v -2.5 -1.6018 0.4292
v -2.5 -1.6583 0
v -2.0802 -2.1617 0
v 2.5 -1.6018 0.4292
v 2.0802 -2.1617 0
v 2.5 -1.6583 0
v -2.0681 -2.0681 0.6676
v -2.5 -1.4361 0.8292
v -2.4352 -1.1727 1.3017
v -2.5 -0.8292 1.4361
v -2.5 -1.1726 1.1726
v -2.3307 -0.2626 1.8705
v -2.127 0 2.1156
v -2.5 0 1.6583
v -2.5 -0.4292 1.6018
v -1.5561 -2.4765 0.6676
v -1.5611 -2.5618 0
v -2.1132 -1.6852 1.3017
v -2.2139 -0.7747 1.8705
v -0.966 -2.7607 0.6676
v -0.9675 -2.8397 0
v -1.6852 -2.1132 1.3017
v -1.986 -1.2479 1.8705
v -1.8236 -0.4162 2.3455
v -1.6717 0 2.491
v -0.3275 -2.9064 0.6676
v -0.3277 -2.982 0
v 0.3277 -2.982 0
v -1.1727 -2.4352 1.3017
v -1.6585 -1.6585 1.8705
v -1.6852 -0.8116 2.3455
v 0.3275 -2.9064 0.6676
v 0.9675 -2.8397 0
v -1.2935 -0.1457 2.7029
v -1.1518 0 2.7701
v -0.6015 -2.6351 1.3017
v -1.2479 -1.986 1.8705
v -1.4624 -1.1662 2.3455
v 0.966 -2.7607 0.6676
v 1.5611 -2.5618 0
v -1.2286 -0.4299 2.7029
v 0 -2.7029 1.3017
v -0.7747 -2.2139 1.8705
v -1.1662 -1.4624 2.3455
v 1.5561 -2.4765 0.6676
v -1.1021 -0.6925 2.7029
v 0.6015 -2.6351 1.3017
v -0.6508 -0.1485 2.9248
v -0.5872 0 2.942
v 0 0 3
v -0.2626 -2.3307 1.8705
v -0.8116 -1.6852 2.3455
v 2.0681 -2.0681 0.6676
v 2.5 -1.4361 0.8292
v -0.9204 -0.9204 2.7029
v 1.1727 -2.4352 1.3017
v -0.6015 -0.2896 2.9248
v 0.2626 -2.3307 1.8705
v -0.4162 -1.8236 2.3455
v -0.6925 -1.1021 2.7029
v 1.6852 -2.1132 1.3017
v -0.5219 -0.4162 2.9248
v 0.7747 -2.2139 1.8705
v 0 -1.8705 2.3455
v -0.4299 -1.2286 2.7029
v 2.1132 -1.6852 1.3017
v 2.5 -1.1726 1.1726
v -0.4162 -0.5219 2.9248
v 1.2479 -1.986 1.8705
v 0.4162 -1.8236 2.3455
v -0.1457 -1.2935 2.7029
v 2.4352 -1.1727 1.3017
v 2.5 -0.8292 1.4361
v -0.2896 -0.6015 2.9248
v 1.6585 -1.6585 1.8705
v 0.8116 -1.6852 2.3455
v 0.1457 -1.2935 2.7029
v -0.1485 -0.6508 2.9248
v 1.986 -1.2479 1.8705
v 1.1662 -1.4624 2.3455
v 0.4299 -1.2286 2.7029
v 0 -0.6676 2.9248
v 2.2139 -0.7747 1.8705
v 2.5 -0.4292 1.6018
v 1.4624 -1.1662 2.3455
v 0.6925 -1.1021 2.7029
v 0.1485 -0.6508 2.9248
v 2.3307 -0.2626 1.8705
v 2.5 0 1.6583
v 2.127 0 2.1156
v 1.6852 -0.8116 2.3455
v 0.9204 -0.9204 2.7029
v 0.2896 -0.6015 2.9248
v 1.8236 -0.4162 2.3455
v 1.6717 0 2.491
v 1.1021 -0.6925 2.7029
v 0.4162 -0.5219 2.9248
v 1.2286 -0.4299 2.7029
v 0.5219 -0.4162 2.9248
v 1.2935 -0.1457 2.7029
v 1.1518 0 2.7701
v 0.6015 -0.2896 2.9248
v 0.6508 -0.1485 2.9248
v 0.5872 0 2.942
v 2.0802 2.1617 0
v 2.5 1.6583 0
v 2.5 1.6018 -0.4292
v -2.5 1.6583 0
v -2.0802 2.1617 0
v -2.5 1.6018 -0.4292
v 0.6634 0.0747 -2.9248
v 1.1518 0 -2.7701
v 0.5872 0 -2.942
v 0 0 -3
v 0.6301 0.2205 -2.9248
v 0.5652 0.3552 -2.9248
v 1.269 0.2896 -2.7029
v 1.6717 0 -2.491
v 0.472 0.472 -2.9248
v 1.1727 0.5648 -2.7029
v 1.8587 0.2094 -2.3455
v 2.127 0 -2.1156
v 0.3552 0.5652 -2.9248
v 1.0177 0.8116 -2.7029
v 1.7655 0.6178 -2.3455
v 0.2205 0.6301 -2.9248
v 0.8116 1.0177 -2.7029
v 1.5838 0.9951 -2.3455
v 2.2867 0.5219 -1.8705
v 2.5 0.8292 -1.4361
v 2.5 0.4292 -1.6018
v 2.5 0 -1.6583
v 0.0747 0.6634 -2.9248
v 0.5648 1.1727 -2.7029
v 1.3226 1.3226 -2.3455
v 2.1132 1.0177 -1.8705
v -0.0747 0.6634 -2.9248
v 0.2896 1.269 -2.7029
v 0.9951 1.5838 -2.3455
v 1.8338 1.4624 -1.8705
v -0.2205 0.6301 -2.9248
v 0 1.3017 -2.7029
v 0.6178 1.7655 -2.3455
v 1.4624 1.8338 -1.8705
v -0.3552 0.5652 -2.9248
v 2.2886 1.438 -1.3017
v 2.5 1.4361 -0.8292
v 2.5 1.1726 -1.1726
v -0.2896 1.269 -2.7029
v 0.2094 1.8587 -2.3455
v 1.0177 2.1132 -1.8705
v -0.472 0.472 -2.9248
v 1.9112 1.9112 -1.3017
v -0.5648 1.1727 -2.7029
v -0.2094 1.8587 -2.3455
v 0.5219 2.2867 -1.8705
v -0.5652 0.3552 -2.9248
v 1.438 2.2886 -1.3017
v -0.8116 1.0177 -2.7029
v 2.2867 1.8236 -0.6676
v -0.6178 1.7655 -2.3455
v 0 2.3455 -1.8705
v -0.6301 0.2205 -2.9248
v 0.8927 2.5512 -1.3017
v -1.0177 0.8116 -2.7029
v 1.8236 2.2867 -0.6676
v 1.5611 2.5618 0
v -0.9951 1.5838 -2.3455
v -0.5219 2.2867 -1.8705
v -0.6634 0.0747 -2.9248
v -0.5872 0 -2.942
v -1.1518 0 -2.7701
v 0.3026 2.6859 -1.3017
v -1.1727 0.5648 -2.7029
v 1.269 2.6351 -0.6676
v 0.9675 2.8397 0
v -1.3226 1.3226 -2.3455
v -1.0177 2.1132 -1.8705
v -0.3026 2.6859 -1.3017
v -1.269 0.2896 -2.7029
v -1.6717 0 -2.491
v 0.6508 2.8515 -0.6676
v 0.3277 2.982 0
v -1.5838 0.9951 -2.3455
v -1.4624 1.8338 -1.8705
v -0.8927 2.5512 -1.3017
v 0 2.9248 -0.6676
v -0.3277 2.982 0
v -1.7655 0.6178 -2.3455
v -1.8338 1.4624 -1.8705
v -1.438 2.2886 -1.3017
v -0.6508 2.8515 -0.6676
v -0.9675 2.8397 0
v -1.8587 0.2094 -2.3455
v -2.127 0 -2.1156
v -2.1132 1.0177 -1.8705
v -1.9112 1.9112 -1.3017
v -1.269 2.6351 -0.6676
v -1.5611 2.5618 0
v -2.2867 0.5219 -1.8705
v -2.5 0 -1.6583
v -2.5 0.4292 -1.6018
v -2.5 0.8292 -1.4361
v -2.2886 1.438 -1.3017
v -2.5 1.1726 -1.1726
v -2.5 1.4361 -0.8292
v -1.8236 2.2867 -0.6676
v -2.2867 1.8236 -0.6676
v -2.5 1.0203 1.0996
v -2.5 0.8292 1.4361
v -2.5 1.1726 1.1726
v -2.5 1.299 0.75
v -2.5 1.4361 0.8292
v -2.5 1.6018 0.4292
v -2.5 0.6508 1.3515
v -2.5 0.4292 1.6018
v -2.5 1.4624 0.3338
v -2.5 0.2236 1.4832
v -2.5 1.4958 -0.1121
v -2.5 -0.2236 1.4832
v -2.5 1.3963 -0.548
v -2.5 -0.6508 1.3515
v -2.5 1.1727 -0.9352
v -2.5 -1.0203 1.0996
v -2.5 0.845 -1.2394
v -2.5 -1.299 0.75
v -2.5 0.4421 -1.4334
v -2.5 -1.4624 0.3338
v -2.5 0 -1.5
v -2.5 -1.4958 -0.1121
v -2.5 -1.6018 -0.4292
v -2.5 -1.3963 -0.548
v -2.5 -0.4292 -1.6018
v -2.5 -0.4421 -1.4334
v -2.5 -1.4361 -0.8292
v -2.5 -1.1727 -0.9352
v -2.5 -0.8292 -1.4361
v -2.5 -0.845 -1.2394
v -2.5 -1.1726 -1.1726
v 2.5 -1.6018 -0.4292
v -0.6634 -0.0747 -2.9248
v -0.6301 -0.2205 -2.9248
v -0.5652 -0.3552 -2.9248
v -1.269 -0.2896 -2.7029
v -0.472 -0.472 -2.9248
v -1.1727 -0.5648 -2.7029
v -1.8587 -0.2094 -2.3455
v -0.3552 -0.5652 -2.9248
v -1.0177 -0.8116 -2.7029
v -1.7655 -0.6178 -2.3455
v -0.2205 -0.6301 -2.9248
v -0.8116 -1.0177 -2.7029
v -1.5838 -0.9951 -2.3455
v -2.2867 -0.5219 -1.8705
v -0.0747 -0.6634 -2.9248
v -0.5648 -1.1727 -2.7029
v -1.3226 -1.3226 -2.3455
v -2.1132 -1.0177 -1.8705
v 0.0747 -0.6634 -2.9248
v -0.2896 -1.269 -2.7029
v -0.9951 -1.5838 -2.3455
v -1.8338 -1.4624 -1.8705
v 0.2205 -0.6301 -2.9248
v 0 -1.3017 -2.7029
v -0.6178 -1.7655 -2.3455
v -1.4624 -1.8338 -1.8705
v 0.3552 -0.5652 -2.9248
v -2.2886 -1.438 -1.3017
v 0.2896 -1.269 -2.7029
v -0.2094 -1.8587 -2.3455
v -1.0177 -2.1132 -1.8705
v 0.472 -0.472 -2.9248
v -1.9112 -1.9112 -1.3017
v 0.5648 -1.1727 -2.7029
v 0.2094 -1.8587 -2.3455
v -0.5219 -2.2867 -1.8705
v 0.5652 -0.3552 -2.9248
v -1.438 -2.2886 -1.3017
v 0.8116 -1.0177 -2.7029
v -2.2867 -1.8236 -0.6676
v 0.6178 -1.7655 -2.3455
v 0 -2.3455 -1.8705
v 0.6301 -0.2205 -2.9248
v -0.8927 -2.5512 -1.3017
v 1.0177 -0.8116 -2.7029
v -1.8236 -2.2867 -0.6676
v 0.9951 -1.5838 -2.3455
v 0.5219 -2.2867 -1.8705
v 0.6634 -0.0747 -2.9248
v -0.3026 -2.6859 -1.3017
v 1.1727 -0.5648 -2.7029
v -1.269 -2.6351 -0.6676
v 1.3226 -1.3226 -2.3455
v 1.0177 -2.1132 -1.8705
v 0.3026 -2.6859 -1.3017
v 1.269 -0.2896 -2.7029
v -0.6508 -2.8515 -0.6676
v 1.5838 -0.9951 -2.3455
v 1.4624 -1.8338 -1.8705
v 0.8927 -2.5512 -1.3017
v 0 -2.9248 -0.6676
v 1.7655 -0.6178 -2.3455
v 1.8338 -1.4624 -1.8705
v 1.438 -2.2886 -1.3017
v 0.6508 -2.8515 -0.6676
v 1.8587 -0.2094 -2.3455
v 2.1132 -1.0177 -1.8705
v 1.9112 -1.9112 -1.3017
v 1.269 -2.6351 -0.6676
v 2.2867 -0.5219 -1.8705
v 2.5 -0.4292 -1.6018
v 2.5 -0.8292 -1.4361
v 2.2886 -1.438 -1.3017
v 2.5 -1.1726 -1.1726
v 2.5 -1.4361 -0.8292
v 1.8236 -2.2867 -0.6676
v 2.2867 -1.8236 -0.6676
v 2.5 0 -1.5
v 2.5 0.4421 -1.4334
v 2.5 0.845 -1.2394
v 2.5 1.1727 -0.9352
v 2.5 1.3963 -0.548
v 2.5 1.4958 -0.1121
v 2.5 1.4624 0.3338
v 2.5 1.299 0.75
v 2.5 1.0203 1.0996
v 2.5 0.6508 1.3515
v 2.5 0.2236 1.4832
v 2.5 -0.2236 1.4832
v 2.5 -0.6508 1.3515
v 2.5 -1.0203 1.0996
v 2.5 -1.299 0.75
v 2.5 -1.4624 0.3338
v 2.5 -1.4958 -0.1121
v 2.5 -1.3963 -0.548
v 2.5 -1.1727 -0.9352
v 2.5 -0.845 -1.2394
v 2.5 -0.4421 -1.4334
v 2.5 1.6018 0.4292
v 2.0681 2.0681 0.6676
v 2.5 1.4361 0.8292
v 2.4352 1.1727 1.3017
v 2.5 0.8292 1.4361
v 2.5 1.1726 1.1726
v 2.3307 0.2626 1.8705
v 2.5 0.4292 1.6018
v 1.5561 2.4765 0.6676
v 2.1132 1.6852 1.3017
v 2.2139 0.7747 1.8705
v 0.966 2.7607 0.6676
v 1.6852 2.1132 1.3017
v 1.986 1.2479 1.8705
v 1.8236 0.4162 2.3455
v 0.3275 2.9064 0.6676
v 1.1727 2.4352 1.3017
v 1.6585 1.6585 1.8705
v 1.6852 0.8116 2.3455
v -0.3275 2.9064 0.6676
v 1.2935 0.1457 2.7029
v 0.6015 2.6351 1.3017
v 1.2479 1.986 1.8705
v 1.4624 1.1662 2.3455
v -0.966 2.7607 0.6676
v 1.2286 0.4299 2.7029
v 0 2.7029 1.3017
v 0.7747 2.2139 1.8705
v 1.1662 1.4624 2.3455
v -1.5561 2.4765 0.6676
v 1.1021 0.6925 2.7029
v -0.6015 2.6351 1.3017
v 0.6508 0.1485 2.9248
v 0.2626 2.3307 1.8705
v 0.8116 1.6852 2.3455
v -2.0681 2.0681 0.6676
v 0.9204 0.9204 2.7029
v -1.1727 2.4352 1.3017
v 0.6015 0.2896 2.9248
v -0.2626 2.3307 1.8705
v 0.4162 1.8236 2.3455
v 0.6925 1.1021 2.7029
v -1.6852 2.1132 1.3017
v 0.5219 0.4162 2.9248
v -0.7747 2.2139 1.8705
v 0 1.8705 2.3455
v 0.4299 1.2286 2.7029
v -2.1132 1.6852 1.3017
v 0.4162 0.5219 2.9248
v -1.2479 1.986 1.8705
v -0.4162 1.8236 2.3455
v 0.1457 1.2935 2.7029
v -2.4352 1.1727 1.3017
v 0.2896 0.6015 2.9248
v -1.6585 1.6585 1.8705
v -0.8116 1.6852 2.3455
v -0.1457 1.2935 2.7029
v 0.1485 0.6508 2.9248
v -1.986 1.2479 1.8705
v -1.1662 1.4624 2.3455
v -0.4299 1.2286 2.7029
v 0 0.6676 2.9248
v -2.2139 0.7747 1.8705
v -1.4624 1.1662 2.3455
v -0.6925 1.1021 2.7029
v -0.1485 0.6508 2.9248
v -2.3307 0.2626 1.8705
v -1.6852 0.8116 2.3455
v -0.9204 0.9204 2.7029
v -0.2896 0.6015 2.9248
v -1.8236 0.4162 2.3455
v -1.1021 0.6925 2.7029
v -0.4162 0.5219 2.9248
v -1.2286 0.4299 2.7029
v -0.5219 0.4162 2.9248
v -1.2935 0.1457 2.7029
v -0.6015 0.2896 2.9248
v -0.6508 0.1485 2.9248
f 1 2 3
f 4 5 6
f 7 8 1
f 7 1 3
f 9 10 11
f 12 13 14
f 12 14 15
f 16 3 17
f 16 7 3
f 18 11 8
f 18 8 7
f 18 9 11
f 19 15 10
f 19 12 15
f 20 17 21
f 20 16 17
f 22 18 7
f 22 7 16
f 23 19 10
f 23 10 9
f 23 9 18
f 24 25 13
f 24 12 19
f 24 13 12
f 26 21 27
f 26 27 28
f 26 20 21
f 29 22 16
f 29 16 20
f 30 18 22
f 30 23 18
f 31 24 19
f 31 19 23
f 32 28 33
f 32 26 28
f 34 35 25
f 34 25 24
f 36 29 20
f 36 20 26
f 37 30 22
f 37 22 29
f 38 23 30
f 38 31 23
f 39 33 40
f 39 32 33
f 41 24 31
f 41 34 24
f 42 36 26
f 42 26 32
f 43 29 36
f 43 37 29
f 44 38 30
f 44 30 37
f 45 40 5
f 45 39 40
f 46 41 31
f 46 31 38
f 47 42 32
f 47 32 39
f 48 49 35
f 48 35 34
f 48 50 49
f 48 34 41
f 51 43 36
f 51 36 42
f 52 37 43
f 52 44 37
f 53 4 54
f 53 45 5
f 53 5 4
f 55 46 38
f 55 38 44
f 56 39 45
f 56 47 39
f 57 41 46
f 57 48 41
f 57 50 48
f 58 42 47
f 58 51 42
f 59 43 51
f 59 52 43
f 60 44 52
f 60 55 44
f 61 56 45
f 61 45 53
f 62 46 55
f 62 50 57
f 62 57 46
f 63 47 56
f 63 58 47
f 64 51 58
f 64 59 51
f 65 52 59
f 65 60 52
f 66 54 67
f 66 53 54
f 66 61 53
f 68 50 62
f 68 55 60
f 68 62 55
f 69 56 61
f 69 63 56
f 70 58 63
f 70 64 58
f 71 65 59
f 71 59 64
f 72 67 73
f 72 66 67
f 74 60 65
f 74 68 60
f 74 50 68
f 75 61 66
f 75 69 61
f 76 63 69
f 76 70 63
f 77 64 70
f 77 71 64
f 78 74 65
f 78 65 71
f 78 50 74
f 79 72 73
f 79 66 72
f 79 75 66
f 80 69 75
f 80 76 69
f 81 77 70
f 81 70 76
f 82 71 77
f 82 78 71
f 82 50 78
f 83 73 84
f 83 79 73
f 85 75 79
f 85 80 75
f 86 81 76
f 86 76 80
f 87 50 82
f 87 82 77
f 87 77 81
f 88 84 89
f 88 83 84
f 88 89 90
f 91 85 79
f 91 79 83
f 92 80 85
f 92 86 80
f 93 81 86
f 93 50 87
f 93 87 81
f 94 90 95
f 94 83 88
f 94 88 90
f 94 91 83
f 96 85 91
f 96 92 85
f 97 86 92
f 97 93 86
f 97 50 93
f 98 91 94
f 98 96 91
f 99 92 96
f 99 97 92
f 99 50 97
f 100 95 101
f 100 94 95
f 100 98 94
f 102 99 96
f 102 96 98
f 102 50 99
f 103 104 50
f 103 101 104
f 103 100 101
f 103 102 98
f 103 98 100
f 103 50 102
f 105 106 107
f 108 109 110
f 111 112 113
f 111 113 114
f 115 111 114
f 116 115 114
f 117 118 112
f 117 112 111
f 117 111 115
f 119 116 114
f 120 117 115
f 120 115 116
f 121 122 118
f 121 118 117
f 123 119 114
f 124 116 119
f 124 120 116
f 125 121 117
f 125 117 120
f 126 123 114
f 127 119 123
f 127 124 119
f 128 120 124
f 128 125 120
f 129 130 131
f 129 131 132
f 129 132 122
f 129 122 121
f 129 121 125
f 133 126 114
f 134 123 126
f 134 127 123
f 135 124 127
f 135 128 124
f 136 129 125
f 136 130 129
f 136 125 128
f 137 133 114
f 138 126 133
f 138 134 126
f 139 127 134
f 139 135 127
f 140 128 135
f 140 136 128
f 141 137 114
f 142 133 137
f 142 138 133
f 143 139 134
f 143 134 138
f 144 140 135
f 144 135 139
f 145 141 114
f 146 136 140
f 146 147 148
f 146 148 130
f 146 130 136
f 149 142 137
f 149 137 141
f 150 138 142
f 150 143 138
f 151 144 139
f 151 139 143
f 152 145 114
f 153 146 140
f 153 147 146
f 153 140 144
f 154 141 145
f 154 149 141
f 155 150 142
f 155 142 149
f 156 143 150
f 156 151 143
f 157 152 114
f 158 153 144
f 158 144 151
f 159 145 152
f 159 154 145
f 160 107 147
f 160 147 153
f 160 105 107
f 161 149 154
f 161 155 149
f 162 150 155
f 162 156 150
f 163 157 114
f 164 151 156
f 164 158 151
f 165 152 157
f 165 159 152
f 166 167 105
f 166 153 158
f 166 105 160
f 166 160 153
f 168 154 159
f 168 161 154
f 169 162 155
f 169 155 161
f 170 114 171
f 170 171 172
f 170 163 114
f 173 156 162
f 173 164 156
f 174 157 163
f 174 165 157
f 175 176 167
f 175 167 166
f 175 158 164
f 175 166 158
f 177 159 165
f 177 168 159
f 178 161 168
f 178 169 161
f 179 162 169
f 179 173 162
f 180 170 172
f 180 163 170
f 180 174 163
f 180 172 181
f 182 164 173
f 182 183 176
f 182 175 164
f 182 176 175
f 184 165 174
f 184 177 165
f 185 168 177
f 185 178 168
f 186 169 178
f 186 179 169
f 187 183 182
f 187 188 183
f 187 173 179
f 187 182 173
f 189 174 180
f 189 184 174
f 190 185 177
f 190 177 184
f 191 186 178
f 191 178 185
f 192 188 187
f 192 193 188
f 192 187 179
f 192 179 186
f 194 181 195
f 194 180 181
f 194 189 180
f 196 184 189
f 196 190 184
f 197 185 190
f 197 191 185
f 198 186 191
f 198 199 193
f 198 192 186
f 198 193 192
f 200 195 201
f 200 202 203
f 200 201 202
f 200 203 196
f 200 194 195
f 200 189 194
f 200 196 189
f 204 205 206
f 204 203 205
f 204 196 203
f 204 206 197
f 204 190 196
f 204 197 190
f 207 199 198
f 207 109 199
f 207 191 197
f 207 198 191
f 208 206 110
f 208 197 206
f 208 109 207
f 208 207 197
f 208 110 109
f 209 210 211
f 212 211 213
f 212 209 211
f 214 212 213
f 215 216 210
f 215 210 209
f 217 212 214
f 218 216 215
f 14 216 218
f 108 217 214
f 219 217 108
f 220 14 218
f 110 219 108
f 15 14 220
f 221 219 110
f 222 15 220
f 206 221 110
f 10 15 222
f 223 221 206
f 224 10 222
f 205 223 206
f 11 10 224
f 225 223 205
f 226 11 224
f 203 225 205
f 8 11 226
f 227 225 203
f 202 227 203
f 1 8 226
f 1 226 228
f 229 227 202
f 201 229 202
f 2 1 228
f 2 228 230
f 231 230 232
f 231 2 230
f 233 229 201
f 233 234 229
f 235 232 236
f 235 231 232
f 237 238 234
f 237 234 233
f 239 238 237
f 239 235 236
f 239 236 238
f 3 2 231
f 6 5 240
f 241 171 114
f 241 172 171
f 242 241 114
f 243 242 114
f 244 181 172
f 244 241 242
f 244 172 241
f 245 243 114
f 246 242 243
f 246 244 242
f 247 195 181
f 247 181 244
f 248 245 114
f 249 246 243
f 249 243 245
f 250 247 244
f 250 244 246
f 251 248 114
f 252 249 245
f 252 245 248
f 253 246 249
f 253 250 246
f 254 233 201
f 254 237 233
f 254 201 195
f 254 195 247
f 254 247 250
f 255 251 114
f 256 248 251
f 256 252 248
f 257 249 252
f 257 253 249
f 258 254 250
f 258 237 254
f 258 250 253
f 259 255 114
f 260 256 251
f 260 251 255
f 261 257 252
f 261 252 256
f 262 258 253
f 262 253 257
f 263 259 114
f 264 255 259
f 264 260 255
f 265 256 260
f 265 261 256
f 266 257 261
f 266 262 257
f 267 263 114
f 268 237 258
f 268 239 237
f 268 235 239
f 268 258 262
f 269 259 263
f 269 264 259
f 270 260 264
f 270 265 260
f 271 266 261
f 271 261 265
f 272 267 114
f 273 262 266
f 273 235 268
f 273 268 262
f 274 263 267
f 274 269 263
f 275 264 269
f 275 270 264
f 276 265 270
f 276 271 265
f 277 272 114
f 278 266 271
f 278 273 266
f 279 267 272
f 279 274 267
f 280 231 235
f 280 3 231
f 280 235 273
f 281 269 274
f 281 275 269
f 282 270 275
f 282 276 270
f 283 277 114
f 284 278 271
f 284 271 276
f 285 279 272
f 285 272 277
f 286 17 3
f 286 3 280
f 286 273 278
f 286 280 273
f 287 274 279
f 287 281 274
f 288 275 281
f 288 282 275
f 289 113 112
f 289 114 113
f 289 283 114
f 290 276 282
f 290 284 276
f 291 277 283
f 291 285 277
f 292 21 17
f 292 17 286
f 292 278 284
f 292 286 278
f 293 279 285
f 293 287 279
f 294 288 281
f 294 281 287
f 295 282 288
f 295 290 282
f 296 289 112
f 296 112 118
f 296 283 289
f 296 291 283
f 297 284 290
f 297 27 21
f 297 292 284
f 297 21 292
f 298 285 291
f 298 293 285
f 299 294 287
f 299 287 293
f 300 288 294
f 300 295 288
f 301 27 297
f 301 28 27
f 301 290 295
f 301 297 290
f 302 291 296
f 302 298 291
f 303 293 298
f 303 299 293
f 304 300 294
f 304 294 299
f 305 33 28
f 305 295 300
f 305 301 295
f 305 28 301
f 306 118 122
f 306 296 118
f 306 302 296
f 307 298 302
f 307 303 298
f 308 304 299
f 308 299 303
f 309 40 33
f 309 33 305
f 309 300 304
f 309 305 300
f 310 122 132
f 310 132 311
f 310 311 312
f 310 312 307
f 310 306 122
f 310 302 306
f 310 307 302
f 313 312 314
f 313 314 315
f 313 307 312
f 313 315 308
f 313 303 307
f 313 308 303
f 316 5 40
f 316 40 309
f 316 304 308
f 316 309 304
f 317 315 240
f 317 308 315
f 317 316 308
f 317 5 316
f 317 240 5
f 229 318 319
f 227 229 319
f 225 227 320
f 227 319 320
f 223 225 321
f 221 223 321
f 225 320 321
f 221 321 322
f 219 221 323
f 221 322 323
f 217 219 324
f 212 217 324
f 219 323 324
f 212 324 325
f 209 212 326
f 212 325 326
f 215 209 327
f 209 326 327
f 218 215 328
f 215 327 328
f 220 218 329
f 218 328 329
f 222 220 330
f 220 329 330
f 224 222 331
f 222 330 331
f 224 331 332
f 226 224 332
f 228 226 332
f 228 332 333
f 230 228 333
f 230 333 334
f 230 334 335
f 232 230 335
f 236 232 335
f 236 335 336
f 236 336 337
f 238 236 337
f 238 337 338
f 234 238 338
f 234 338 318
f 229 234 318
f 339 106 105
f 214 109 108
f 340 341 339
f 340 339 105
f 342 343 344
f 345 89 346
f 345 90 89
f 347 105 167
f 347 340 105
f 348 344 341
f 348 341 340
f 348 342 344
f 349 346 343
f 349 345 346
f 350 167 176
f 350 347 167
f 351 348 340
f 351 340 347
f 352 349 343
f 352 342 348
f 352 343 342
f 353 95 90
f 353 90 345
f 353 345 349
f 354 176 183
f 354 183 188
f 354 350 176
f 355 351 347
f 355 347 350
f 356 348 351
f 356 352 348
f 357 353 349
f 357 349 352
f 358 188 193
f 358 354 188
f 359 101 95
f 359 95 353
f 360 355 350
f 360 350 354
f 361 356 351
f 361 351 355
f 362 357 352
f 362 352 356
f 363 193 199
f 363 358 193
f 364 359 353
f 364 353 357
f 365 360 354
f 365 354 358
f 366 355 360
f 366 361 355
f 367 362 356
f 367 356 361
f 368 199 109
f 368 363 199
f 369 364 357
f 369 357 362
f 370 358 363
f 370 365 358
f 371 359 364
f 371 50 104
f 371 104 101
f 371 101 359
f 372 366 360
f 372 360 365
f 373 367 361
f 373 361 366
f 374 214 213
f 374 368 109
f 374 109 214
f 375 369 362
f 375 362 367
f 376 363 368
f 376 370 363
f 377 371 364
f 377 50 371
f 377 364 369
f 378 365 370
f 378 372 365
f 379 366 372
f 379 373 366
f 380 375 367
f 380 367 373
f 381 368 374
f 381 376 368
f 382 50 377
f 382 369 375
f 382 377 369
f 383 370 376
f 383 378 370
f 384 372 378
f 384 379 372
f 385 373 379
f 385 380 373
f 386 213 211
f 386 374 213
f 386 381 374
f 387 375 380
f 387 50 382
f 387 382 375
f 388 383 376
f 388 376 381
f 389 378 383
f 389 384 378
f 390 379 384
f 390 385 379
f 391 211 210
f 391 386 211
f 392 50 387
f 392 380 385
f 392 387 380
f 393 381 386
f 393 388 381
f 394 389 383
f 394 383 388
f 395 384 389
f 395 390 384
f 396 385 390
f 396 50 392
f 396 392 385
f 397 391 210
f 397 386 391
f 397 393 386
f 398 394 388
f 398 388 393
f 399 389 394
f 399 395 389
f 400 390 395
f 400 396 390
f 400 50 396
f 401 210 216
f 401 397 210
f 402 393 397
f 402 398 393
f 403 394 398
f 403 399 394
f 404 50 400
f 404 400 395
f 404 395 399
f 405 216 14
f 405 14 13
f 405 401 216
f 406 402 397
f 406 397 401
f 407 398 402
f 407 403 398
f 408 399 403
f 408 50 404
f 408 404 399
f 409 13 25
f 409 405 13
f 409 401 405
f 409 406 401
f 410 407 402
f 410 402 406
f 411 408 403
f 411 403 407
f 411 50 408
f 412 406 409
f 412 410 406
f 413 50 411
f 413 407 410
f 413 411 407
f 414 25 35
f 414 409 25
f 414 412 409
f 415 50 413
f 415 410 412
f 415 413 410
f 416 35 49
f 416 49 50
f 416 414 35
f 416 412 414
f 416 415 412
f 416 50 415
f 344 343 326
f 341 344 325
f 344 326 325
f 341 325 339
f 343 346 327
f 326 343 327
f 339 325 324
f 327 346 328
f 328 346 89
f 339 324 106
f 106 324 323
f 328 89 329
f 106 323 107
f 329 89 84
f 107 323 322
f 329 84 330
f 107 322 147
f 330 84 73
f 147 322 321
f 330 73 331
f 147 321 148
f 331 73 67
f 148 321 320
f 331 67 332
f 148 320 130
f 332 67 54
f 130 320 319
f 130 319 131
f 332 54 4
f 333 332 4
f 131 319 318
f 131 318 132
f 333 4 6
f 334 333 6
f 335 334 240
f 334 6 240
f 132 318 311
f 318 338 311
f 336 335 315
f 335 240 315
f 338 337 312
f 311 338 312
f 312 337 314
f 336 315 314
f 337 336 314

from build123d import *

# Parameters (mm, degrees)
CUT_EXTRUDE_1_DEPTH      = 10
CUT_EXTRUDE_1_DEPTH_BACK = 10
SKETCH_2_W               = 8.130865192
SKETCH_2_H               = 8.836363256
SKETCH_2_W_2             = 5
SKETCH_2_H_2             = 6.113384394
SKETCH_3_R               = 1.5
CUT_EXTRUDE_2_DEPTH      = 10


with BuildPart() as part:
    # 草图1 → 旋转1 (revolve)
    with BuildSketch(Plane(origin=(0, 0, 0), x_dir=(1, 0, 0), z_dir=(0, 1, 0))):
        with BuildLine():
            ThreePointArc((3, 0), (2.121320344, 2.121320344), (0, 3))
            Line((0, 3), (0, -3))
            ThreePointArc((0, -3), (2.121320344, -2.121320344), (3, 0))
        make_face()
    revolve(axis=Axis((0, 0, -3), (0, 0, 1)))

    # 草图2 → 切除-拉伸1 (cut, two sides: drawn at the far end of the back side and taken through both)
    with BuildSketch(Plane(origin=(0, 0, 0), x_dir=(1, 0, 0), z_dir=(0, 1, 0)).offset(-CUT_EXTRUDE_1_DEPTH_BACK)):
        with Locations((0.270511146, -0.599851934)):
            Rectangle(SKETCH_2_W, SKETCH_2_H)
        Rectangle(SKETCH_2_W_2, SKETCH_2_H_2, mode=Mode.SUBTRACT)
    extrude(amount=CUT_EXTRUDE_1_DEPTH + CUT_EXTRUDE_1_DEPTH_BACK, mode=Mode.SUBTRACT)

    # 草图3 → 切除-拉伸2 (cut)
    with BuildSketch(Plane(origin=(2.5, 0, 0), x_dir=(0, 0, -1), z_dir=(1, 0, 0))):
        Circle(SKETCH_3_R)
    extrude(amount=-CUT_EXTRUDE_2_DEPTH, mode=Mode.SUBTRACT)


solid = part.part
